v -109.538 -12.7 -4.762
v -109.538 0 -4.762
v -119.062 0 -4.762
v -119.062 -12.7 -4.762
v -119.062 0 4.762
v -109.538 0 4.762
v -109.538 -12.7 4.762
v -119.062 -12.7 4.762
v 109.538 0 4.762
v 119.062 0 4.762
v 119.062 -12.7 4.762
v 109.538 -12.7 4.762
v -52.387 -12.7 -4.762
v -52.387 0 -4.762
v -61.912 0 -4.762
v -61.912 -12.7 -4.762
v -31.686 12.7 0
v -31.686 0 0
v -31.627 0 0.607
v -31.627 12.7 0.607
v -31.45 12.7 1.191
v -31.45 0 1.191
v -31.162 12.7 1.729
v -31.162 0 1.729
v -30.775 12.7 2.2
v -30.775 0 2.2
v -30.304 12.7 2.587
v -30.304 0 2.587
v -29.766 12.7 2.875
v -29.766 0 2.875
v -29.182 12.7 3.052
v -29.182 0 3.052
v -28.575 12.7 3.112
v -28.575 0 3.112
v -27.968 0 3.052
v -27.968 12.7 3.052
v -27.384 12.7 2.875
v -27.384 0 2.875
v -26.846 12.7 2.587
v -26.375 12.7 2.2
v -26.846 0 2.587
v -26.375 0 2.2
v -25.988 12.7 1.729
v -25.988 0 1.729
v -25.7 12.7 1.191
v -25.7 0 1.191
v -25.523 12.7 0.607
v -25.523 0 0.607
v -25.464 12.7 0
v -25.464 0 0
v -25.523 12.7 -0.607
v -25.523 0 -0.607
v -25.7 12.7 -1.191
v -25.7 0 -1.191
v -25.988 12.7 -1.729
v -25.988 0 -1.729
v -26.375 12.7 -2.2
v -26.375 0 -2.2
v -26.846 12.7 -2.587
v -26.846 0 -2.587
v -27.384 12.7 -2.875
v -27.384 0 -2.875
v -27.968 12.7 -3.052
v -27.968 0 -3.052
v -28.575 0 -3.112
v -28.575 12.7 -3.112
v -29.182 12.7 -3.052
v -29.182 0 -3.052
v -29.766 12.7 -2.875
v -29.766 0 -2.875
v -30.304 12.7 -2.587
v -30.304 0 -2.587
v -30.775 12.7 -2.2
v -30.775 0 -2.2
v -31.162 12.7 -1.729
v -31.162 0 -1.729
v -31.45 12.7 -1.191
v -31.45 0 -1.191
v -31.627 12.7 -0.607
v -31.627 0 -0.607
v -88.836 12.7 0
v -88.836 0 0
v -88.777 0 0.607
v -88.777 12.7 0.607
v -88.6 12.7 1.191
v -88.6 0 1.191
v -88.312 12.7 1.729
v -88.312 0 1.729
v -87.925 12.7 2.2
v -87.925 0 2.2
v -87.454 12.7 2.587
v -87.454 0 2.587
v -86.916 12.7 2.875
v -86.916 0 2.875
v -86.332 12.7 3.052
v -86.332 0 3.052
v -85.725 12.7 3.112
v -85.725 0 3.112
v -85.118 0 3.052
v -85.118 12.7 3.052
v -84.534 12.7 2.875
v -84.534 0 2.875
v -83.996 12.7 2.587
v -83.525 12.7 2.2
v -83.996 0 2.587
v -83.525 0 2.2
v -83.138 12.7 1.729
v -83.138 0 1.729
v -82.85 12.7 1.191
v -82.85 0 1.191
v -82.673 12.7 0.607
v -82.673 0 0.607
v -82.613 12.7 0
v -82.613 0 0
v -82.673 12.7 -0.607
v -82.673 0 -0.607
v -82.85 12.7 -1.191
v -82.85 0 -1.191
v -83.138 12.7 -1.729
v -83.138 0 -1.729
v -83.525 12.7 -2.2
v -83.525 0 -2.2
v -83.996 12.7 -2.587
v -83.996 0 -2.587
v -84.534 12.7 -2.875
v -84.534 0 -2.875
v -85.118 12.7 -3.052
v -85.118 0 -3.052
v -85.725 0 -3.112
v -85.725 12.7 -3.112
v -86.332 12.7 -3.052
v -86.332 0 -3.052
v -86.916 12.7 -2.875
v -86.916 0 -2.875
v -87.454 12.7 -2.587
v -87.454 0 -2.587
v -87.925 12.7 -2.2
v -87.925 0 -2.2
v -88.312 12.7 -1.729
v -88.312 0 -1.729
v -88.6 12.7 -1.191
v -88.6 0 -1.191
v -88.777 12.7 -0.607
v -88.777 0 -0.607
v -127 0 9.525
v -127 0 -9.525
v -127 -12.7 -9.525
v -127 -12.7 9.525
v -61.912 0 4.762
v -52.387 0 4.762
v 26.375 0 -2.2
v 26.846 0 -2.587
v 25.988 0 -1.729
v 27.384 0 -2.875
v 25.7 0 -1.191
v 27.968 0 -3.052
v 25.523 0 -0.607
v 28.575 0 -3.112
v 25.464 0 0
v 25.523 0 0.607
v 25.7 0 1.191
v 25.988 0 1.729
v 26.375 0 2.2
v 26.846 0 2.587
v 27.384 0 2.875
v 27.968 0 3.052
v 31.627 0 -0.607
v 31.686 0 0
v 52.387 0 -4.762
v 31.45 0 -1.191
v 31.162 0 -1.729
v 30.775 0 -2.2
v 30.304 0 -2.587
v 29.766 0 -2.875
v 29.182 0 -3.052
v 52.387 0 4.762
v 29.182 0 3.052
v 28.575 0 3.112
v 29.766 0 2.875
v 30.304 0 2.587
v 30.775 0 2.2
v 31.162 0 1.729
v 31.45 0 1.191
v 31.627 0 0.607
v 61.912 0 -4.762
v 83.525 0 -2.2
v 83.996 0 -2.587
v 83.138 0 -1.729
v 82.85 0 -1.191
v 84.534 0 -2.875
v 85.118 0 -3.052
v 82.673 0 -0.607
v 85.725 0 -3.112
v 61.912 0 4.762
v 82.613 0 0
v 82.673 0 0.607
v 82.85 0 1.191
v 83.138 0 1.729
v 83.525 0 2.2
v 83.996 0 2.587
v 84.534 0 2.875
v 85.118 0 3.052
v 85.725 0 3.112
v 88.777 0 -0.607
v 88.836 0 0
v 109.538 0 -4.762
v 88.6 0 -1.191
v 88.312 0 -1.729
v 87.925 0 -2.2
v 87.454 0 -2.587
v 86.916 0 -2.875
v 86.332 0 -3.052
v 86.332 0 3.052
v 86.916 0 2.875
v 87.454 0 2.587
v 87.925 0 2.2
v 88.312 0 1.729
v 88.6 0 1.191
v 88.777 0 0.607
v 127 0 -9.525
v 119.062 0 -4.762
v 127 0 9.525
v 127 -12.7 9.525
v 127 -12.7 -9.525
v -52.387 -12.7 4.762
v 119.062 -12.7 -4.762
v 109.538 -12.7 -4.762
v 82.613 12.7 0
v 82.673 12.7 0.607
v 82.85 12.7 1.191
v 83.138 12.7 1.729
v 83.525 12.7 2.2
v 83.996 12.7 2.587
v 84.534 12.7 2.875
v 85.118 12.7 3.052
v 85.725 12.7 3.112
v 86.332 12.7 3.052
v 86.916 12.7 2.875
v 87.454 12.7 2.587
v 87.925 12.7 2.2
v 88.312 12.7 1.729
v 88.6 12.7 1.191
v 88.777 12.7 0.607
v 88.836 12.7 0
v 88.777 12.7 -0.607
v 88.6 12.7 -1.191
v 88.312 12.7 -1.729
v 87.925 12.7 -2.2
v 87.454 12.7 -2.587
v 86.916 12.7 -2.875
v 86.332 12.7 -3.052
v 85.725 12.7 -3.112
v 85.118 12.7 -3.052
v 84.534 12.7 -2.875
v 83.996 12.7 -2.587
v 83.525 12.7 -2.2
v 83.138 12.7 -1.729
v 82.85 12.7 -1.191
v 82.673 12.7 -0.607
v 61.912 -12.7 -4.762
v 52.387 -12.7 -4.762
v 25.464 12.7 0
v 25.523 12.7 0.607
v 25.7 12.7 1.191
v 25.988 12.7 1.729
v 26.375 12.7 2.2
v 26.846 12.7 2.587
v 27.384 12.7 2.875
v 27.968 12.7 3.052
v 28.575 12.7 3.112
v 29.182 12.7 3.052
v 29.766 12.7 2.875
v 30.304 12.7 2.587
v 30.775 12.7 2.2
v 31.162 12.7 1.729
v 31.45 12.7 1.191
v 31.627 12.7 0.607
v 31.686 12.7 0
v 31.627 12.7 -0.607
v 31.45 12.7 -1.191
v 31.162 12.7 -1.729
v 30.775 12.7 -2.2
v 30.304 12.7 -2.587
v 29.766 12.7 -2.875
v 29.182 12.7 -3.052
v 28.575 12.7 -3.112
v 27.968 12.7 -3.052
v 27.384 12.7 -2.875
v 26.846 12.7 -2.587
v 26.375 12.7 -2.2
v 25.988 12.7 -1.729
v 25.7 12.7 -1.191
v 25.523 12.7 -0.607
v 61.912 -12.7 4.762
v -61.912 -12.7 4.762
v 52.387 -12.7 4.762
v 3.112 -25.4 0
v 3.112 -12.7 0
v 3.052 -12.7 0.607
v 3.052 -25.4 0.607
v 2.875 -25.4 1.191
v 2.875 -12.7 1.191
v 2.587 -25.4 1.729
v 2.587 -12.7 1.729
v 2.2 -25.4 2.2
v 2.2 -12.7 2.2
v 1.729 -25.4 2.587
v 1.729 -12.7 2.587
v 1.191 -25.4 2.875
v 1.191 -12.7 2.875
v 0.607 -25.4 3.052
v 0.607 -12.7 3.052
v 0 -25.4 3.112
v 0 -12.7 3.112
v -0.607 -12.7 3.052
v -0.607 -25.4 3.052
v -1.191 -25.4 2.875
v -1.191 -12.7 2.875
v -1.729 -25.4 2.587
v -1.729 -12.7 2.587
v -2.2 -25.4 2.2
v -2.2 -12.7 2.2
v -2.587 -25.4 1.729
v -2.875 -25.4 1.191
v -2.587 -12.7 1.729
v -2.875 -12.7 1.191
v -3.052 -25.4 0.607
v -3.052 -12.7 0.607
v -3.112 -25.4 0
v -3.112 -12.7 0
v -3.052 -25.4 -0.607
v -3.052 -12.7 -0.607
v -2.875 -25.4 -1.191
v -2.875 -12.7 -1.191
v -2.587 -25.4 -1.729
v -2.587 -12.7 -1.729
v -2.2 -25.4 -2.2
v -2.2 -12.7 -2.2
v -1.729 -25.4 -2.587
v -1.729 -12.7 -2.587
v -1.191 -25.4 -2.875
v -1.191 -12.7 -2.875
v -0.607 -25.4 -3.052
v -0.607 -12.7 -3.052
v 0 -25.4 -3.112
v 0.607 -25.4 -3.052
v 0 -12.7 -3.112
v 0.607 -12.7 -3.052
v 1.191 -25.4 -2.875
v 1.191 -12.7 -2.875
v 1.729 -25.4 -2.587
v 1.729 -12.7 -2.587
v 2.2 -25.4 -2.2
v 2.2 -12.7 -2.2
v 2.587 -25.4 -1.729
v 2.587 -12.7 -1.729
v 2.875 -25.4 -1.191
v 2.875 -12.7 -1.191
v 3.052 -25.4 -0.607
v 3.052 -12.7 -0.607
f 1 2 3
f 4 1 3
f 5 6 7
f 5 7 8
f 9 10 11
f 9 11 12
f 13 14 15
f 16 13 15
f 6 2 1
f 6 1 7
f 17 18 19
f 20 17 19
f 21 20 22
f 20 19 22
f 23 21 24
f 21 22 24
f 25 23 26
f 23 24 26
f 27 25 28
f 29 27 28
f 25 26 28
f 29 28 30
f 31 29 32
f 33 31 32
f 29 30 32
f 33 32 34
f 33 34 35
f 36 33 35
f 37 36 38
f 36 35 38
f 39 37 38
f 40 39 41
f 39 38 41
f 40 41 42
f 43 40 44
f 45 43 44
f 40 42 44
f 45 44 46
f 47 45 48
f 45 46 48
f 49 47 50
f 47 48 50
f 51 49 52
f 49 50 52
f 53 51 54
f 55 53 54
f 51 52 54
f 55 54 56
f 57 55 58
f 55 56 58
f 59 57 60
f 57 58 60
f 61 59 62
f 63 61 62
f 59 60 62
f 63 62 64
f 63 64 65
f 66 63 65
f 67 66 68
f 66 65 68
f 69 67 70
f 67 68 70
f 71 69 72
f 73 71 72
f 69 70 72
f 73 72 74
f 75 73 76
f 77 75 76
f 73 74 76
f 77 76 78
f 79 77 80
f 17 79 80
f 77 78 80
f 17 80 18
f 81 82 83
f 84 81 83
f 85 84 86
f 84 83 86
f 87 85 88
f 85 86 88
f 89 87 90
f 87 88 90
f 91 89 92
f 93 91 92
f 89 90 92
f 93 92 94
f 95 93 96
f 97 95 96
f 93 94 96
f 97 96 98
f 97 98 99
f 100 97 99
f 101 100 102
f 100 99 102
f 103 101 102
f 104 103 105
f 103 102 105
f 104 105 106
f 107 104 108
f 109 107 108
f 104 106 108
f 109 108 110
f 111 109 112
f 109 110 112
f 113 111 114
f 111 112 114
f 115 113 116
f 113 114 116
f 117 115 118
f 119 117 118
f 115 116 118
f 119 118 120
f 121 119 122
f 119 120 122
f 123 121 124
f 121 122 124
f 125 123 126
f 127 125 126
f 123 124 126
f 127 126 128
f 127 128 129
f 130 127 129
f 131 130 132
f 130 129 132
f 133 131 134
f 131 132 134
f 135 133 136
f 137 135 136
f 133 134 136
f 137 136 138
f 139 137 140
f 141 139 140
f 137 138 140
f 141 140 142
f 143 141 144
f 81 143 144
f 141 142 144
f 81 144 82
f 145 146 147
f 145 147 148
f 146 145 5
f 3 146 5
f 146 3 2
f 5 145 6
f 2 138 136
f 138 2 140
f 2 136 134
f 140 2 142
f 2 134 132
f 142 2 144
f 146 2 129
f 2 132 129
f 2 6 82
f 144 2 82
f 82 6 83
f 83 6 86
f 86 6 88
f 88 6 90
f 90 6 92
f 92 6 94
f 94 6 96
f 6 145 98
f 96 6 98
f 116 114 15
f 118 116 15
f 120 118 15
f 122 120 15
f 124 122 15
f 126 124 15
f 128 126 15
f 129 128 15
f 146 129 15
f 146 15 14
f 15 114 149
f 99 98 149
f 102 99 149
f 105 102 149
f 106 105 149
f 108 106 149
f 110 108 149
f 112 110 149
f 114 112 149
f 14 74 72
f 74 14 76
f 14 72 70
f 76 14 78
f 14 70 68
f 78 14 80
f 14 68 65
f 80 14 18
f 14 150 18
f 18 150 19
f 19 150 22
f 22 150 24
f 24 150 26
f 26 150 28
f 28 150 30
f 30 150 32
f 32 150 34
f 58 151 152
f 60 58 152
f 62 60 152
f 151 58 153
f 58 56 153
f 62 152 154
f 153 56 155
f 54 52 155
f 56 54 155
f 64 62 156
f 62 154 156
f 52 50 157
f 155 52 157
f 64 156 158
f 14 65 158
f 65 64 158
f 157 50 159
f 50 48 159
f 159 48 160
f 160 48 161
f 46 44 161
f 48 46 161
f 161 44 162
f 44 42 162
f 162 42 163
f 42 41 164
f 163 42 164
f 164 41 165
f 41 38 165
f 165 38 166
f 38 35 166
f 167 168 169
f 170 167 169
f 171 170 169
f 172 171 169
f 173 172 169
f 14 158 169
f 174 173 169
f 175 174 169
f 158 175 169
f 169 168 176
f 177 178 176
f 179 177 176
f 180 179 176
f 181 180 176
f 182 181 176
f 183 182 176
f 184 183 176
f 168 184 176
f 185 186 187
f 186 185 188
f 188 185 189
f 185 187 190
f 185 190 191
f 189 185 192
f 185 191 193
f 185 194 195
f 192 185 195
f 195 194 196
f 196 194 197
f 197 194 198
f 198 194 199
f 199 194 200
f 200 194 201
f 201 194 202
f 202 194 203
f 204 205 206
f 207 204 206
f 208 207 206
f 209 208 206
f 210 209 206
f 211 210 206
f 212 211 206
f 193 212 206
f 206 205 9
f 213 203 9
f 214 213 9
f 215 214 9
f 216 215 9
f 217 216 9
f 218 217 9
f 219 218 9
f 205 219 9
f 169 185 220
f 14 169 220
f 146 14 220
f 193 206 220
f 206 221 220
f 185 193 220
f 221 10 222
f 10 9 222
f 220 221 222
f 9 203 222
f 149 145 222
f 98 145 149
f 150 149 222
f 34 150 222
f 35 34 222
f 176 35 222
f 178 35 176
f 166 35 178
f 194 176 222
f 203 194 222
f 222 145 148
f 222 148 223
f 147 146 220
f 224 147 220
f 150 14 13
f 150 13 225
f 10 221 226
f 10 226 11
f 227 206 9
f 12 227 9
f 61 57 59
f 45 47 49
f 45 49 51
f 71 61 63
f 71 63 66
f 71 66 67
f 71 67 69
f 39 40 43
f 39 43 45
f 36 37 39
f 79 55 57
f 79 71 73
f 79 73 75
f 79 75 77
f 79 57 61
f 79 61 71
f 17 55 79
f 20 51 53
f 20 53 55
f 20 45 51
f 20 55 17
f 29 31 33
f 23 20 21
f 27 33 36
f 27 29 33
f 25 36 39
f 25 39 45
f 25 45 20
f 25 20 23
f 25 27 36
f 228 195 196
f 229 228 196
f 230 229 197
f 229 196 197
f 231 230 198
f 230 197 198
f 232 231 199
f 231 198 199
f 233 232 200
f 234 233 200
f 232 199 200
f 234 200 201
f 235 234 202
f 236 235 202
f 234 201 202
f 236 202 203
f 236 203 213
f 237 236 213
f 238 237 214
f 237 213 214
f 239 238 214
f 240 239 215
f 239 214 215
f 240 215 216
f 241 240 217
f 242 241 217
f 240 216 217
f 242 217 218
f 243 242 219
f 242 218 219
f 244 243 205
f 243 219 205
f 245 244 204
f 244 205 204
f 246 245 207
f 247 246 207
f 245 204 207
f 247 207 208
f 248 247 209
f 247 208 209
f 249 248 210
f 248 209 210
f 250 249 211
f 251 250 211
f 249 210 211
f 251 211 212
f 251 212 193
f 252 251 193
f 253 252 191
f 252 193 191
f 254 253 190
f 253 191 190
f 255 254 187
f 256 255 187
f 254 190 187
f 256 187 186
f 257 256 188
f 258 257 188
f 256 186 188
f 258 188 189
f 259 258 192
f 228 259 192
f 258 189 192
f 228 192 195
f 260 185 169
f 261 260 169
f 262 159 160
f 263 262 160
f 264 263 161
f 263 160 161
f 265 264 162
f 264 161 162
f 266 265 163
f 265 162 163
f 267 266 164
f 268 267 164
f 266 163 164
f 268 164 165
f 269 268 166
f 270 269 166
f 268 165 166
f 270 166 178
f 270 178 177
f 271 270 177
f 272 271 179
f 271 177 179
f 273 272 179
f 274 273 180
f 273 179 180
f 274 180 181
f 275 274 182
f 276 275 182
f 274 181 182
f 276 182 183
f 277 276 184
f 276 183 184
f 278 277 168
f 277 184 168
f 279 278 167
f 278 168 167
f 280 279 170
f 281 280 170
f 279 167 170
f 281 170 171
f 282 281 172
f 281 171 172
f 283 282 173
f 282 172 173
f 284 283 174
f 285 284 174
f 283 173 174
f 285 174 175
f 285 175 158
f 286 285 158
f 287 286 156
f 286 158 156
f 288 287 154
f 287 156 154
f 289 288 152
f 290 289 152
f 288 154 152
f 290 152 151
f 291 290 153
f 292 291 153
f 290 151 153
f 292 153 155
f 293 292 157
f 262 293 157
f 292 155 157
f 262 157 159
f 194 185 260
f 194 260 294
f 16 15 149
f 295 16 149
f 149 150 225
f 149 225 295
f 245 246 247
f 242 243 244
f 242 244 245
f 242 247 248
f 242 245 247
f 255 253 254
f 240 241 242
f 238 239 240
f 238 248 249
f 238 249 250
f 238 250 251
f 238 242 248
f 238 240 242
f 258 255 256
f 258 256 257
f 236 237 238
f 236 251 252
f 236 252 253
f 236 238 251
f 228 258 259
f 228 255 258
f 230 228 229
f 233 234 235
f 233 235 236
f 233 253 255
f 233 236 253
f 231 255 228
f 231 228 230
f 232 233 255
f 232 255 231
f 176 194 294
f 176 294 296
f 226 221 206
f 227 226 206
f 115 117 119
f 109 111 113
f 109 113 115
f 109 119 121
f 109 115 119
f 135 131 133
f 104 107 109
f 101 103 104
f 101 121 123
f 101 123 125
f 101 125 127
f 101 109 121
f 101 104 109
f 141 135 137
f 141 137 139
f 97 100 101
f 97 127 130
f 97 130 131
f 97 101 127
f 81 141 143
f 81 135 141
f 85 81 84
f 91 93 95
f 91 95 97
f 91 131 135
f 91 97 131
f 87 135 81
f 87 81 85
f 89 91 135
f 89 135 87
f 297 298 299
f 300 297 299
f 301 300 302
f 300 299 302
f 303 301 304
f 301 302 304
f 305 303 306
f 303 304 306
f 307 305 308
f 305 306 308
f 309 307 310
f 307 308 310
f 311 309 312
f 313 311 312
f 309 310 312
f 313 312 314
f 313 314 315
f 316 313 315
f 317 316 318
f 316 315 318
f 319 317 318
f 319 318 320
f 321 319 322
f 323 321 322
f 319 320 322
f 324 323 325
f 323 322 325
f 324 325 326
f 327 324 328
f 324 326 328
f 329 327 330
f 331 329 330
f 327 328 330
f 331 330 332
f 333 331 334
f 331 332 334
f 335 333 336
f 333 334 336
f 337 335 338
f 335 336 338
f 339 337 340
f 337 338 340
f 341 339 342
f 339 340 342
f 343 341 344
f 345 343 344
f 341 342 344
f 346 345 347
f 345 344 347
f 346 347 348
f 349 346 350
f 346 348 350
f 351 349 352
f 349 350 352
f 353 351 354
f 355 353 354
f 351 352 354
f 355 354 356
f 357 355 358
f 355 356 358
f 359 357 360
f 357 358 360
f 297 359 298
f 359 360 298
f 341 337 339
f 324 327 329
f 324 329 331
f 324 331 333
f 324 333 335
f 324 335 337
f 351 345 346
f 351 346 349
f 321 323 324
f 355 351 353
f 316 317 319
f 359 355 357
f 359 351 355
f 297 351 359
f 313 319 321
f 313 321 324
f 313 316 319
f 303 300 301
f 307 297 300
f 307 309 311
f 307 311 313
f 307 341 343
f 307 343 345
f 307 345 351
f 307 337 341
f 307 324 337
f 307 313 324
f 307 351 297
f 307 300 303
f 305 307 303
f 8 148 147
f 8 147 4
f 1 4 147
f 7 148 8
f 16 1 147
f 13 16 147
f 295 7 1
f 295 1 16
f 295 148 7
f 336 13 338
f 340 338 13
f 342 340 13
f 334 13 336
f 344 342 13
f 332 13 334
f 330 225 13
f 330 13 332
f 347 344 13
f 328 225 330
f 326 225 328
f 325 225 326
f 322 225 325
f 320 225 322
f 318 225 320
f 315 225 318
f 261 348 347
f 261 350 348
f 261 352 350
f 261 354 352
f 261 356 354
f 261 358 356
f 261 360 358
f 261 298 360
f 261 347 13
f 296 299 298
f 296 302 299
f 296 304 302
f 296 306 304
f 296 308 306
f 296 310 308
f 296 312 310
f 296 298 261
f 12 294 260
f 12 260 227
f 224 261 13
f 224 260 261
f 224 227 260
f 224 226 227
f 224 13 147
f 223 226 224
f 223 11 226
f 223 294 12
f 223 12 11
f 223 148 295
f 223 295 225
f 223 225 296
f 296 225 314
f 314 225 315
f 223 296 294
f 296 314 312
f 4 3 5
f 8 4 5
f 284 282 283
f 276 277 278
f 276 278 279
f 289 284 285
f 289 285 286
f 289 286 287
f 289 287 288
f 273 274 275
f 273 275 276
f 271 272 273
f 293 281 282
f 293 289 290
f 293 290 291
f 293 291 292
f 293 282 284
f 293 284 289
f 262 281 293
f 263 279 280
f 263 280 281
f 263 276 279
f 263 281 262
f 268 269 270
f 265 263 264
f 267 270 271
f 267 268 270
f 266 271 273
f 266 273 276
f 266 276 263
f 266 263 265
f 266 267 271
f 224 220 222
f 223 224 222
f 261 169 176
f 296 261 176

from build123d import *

# Parameters (mm, degrees)
F0_W     = 254
F0_H     = 19.05
F1_DEPTH = 12.7
F2_R     = 3.1115
F3_DEPTH = 12.7
F4_W     = 9.525
F4_H     = 9.525
F4_R     = 3.1115
F5_DEPTH = 12.7
F6_DEPTH = 25.4


# Not quite as in the source:
# - a feature names something its author has since deleted; it is built from what else it names


with BuildPart() as f1:
    # F0 (on Front) → F1 (new body)
    with BuildSketch(Plane.XZ):
        Rectangle(F0_W, F0_H)
    extrude(amount=F1_DEPTH)

    # F2 (on face) → F3 (join)
    with BuildSketch(Plane.XZ.offset(12.7)):
        Circle(F2_R)
    extrude(amount=F3_DEPTH)

    # F4 (on face) → F5 (join)
    with BuildSketch(Plane(origin=(0, 0, 0), x_dir=(-1, 0, 0), z_dir=(0, 1, 0))):
        with Locations((-114.3, 0)):
            Rectangle(F4_W, F4_H)
        with Locations((-85.725, 0)):
            Circle(F4_R)
        with Locations((-57.15, 0)):
            Rectangle(F4_W, F4_H)
        with Locations((-28.575, 0)):
            Circle(F4_R)
        with Locations((28.575, 0)):
            Circle(F4_R)
        with Locations((57.15, 0)):
            Rectangle(F4_W, F4_H)
        with Locations((85.725, 0)):
            Circle(F4_R)
        with Locations((114.3, 0)):
            Rectangle(F4_W, F4_H)
    extrude(amount=F5_DEPTH)

    # F6 (cut): faces of the model
    f6_faces = [f1.faces().sort_by_distance(p)[0] for p in [
        (114.3, 12.7, 0),
        (57.15, 12.7, 0),
        (-57.15, 12.7, 0),
        (-114.3, 12.7, 0),
    ]]
    extrude(f6_faces, amount=-F6_DEPTH, mode=Mode.SUBTRACT)


solid = f1.part
